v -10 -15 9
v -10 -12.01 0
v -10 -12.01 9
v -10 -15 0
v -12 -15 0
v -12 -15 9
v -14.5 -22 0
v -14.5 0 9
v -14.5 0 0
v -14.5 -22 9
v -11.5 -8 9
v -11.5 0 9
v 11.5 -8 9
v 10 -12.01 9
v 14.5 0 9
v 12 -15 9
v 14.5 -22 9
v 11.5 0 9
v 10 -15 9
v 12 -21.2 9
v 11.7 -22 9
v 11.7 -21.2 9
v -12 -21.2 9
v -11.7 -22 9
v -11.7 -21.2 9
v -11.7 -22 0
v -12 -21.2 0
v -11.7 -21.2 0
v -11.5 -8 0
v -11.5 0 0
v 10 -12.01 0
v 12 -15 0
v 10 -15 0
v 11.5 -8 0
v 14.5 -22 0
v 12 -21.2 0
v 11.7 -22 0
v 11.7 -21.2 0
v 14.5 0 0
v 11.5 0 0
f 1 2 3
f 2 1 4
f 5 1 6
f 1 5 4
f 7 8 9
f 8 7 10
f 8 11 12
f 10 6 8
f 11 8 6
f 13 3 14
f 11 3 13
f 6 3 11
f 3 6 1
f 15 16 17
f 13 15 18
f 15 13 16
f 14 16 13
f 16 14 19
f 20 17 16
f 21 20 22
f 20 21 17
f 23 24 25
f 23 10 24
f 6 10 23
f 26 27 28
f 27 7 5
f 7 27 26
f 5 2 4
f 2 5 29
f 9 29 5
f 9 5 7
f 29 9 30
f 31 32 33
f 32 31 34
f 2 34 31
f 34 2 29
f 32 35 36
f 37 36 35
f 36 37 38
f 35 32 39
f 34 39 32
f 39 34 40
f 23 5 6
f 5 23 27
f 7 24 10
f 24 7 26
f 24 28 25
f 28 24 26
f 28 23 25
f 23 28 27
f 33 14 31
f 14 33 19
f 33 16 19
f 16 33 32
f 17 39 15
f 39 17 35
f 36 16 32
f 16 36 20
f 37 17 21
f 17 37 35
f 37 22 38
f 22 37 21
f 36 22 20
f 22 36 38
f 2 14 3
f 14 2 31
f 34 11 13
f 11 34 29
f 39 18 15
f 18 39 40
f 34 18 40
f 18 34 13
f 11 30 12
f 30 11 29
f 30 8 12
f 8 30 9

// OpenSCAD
//
// A stand for miniature computer BOSGAME AG40
//

in_w = 24.0;
out_w = in_w + 2.5*2;
main_th = 9.0;
leg_h = 8.0;
leg_w = 3.0;

arm_base_h = 3.0;
arm_side_h = arm_base_h + 7.0;

module stand_arm () {
    // base
    translate([0, 0, 0])
        cube([(out_w - in_w)/2 + 2.0, main_th, arm_base_h]);
    // Actual arm
    translate([0, 0, 0])
        cube([(out_w - in_w)/2, main_th, arm_side_h]);
    // Nub
    translate([0, 0, arm_side_h - 0.8])
        cube([(out_w - in_w)/2 + 0.3, main_th, 0.8]);
}

module stand () {

    // arms
    translate([(out_w/2)*-1, 0, leg_h + 4.0])
        stand_arm();
    mirror([1,0,0])
        translate([(out_w/2)*-1, 0, leg_h + 4.0])
            stand_arm();
    // main base
    translate([(out_w/2)*-1, 0, leg_h])
        cube([out_w, main_th, 4.0 + 0.01]);
    // legs
    translate([out_w/2 - leg_w, 0, 0])
        cube([leg_w, main_th, leg_h + 0.01]);
    translate([(out_w/2)*-1, 0, 0])
        cube([leg_w, main_th, leg_h + 0.01]);
}

// stand();
rotate(90.0, [1,0,0]) stand();
